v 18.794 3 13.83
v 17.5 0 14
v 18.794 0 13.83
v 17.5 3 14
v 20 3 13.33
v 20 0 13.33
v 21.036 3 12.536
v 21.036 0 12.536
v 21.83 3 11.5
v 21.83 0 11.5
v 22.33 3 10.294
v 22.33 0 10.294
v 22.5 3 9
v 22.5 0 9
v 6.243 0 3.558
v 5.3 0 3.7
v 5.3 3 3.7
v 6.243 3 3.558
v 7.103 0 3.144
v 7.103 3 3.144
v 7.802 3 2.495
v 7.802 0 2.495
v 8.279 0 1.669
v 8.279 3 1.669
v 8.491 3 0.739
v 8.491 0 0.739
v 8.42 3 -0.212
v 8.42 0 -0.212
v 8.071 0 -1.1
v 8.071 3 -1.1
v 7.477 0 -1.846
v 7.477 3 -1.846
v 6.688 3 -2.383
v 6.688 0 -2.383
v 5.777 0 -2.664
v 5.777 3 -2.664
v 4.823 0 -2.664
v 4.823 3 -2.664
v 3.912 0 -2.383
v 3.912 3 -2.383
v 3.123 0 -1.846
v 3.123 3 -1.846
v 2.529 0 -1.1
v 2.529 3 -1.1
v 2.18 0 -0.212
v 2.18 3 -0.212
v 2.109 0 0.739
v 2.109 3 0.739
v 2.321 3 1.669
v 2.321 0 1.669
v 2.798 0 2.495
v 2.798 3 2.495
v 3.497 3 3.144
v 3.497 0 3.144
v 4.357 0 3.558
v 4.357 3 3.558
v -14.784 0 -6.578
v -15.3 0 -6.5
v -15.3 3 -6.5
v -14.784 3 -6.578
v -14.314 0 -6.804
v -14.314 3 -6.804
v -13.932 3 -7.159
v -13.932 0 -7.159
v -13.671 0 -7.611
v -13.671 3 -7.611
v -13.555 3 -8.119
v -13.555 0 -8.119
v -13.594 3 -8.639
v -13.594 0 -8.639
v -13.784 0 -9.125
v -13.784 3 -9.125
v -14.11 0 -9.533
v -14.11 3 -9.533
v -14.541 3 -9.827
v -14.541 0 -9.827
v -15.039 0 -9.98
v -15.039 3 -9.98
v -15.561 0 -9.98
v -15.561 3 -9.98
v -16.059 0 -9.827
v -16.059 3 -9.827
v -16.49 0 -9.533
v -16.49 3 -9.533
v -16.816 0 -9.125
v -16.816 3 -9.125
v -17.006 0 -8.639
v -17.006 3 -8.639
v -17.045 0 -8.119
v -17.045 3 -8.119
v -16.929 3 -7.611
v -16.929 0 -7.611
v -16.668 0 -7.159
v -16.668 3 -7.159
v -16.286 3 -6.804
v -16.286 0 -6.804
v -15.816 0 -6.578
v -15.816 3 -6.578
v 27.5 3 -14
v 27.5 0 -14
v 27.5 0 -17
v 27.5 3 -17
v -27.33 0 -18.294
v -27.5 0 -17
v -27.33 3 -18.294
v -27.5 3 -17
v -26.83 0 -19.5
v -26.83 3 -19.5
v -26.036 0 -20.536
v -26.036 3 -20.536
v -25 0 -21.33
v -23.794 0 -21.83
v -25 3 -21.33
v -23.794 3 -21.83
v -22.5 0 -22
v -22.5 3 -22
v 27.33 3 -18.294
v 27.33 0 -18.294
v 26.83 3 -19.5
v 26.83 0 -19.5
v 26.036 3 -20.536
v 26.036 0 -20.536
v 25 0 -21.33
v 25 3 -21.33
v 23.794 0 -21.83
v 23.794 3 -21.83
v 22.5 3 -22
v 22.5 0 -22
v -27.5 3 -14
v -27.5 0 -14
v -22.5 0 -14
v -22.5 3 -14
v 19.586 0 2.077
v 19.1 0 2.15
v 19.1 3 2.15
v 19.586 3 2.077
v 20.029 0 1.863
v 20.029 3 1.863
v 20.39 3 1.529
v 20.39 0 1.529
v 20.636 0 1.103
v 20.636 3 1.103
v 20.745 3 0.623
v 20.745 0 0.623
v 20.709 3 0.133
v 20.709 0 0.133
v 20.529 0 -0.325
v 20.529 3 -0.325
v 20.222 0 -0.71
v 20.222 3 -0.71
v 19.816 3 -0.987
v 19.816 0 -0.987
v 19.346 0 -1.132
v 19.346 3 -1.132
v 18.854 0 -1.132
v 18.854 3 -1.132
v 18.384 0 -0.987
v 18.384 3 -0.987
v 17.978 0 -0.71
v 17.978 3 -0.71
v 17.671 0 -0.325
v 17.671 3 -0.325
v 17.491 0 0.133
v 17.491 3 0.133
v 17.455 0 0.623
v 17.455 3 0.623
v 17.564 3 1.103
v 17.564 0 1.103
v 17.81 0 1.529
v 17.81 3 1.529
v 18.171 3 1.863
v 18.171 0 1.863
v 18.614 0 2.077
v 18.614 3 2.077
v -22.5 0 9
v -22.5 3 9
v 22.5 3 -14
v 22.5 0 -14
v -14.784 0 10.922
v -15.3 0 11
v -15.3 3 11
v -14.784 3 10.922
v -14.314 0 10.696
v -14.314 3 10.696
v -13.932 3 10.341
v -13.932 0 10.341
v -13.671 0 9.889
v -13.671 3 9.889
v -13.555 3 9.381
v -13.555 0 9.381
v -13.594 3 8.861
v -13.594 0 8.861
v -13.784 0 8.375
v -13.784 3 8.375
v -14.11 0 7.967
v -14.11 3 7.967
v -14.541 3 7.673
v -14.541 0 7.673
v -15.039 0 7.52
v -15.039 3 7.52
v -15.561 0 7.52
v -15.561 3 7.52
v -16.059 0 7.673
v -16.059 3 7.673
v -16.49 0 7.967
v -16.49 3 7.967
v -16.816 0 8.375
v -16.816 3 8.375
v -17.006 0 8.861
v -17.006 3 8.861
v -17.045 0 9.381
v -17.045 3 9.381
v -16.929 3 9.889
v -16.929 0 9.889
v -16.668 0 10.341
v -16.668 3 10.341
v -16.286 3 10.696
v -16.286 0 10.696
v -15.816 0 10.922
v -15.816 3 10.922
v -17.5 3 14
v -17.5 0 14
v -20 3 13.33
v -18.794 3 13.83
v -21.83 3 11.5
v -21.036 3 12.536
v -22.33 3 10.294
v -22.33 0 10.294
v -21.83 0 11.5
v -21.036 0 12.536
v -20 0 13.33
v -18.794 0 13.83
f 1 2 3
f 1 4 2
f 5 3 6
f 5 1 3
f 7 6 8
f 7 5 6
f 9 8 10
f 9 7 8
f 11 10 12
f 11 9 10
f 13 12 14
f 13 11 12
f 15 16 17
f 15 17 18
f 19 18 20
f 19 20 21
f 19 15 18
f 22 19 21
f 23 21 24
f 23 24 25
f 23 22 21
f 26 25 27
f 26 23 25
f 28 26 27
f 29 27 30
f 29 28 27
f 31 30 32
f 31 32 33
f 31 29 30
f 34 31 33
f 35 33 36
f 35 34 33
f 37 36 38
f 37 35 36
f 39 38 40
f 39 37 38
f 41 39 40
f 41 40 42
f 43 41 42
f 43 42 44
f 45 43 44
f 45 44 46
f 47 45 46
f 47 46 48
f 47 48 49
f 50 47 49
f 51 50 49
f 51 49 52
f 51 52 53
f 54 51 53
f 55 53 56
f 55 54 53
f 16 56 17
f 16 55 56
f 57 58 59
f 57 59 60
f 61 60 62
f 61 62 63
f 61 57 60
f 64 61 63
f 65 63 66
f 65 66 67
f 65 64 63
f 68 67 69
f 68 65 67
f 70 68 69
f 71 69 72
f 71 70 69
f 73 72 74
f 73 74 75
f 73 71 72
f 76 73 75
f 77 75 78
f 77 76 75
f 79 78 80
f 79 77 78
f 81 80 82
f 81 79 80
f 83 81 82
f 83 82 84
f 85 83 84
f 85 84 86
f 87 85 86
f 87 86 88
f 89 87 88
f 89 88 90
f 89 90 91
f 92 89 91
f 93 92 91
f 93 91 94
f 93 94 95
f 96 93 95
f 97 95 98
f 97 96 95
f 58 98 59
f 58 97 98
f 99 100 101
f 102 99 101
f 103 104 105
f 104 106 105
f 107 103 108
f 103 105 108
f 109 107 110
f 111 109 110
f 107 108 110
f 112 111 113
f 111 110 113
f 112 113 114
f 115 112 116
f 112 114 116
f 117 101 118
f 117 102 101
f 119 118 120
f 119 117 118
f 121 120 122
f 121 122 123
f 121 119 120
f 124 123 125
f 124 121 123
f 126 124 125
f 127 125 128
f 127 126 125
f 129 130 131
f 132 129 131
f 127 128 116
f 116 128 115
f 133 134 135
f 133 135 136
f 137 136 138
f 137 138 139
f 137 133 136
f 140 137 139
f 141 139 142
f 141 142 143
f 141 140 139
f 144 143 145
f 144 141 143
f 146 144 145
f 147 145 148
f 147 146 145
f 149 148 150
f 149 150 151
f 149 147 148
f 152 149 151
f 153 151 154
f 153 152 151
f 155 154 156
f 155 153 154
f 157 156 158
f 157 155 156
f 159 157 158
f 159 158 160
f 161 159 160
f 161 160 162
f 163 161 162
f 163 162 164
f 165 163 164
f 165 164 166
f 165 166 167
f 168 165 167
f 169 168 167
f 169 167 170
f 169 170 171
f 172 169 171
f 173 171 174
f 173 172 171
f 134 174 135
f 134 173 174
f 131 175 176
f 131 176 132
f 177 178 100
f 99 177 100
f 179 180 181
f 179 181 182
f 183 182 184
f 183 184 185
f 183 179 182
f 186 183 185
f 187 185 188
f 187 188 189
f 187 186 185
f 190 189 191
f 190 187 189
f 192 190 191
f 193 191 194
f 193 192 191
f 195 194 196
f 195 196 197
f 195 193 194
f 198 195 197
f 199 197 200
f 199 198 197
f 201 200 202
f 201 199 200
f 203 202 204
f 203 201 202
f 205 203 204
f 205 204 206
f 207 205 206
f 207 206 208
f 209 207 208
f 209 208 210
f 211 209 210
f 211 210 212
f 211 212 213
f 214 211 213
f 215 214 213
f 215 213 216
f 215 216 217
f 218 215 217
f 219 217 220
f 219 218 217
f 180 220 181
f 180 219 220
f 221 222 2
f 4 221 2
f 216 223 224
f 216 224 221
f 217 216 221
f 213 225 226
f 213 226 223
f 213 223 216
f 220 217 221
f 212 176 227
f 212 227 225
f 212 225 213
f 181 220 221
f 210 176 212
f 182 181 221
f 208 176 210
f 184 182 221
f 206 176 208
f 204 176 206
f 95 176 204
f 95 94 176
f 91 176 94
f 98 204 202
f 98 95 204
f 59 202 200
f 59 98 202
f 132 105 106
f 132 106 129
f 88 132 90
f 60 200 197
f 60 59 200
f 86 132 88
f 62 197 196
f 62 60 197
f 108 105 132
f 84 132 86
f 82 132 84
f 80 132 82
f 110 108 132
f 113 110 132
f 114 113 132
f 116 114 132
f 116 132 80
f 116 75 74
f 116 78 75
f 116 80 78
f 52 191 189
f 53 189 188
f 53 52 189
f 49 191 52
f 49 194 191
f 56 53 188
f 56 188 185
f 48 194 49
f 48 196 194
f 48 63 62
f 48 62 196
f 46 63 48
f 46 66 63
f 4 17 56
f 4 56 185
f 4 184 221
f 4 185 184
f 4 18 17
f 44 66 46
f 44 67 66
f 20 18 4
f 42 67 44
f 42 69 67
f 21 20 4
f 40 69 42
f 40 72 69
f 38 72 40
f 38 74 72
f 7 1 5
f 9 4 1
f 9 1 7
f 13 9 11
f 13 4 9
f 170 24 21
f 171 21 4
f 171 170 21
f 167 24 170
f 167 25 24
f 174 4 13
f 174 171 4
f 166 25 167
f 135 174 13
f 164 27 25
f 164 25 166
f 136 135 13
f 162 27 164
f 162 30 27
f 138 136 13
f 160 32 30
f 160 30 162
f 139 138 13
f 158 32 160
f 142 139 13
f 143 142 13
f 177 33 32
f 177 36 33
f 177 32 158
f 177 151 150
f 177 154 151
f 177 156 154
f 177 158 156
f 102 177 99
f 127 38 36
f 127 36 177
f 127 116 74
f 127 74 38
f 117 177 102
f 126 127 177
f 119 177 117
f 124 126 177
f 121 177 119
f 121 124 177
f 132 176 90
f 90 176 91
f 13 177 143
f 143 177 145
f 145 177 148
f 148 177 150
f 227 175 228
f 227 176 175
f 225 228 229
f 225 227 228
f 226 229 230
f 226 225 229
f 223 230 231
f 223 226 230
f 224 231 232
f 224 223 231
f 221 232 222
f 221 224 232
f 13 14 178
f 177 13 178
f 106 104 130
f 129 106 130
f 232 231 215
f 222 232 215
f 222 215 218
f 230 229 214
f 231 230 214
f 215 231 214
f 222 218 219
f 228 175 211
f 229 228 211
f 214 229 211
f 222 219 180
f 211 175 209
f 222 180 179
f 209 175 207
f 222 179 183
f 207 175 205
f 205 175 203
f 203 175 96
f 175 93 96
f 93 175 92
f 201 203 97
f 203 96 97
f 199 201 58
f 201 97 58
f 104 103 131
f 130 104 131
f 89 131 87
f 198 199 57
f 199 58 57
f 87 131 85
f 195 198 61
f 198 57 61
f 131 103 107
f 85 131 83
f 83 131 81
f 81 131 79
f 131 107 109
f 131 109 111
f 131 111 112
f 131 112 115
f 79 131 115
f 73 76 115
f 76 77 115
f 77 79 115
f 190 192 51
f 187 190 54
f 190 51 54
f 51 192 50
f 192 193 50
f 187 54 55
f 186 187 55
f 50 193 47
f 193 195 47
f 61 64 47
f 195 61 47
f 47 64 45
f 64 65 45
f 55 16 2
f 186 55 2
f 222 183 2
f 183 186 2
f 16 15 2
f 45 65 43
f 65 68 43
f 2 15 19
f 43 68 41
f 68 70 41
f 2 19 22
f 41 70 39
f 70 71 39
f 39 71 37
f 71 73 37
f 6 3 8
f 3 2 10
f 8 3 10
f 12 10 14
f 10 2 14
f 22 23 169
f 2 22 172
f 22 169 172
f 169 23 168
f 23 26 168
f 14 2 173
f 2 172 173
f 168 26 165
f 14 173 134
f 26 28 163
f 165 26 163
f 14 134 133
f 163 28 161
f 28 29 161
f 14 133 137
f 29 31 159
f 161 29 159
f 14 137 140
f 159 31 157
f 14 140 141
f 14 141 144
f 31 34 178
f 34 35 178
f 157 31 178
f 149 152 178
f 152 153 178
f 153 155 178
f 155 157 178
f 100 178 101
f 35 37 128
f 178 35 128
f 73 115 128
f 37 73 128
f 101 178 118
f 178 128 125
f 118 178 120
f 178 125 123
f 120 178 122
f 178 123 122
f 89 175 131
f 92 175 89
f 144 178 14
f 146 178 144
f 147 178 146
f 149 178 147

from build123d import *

# Parameters (mm, degrees)
SKETCH1_W           = 45
SKETCH1_H           = 28
SKETCH1_R           = 1.65
SKETCH1_R_2         = 3.2
SKETCH1_R_3         = 1.75
BOSS_EXTRUDE1_DEPTH = 3
FILLET1_R           = 5


with BuildPart() as part:
    # Sketch1 → Boss-Extrude1 (new body)
    # profile 1 of 2: a face of its own
    with BuildSketch(Plane(origin=(0, 0, 0), x_dir=(1, 0, 0), z_dir=(0, 1, 0))):
        Polygon((-27.5, 14), (-22.5, 14), (22.5, 14), (27.5, 14), (27.5, 22), (-27.5, 22), align=None)
    # profile 2 of 2: a face of its own
    with BuildSketch(Plane(origin=(0, 0, 0), x_dir=(1, 0, 0), z_dir=(0, 1, 0))):
        Rectangle(SKETCH1_W, SKETCH1_H)
        with Locations(Location((19.1, -0.5, 0), (0, 0, 270))):
            Circle(SKETCH1_R, mode=Mode.SUBTRACT)
        with Locations(Location((5.3, -0.5, 0), (0, 0, 270))):
            Circle(SKETCH1_R_2, mode=Mode.SUBTRACT)
        with Locations(Location((-15.3, 8.25, 0), (0, 0, 270))):
            Circle(SKETCH1_R_3, mode=Mode.SUBTRACT)
        with Locations(Location((-15.3, -9.25, 0), (0, 0, 270))):
            Circle(SKETCH1_R_3, mode=Mode.SUBTRACT)
    extrude(amount=BOSS_EXTRUDE1_DEPTH)

    # Fillet1
    fillet1_edges = [part.edges().sort_by_distance(p)[0] for p in [
        (-27.5, 1.5, -22),
        (27.5, 1.5, -22),
        (22.5, 1.5, 14),
        (-22.5, 1.5, 14),
    ]]
    fillet(fillet1_edges, radius=FILLET1_R)


solid = part.part
